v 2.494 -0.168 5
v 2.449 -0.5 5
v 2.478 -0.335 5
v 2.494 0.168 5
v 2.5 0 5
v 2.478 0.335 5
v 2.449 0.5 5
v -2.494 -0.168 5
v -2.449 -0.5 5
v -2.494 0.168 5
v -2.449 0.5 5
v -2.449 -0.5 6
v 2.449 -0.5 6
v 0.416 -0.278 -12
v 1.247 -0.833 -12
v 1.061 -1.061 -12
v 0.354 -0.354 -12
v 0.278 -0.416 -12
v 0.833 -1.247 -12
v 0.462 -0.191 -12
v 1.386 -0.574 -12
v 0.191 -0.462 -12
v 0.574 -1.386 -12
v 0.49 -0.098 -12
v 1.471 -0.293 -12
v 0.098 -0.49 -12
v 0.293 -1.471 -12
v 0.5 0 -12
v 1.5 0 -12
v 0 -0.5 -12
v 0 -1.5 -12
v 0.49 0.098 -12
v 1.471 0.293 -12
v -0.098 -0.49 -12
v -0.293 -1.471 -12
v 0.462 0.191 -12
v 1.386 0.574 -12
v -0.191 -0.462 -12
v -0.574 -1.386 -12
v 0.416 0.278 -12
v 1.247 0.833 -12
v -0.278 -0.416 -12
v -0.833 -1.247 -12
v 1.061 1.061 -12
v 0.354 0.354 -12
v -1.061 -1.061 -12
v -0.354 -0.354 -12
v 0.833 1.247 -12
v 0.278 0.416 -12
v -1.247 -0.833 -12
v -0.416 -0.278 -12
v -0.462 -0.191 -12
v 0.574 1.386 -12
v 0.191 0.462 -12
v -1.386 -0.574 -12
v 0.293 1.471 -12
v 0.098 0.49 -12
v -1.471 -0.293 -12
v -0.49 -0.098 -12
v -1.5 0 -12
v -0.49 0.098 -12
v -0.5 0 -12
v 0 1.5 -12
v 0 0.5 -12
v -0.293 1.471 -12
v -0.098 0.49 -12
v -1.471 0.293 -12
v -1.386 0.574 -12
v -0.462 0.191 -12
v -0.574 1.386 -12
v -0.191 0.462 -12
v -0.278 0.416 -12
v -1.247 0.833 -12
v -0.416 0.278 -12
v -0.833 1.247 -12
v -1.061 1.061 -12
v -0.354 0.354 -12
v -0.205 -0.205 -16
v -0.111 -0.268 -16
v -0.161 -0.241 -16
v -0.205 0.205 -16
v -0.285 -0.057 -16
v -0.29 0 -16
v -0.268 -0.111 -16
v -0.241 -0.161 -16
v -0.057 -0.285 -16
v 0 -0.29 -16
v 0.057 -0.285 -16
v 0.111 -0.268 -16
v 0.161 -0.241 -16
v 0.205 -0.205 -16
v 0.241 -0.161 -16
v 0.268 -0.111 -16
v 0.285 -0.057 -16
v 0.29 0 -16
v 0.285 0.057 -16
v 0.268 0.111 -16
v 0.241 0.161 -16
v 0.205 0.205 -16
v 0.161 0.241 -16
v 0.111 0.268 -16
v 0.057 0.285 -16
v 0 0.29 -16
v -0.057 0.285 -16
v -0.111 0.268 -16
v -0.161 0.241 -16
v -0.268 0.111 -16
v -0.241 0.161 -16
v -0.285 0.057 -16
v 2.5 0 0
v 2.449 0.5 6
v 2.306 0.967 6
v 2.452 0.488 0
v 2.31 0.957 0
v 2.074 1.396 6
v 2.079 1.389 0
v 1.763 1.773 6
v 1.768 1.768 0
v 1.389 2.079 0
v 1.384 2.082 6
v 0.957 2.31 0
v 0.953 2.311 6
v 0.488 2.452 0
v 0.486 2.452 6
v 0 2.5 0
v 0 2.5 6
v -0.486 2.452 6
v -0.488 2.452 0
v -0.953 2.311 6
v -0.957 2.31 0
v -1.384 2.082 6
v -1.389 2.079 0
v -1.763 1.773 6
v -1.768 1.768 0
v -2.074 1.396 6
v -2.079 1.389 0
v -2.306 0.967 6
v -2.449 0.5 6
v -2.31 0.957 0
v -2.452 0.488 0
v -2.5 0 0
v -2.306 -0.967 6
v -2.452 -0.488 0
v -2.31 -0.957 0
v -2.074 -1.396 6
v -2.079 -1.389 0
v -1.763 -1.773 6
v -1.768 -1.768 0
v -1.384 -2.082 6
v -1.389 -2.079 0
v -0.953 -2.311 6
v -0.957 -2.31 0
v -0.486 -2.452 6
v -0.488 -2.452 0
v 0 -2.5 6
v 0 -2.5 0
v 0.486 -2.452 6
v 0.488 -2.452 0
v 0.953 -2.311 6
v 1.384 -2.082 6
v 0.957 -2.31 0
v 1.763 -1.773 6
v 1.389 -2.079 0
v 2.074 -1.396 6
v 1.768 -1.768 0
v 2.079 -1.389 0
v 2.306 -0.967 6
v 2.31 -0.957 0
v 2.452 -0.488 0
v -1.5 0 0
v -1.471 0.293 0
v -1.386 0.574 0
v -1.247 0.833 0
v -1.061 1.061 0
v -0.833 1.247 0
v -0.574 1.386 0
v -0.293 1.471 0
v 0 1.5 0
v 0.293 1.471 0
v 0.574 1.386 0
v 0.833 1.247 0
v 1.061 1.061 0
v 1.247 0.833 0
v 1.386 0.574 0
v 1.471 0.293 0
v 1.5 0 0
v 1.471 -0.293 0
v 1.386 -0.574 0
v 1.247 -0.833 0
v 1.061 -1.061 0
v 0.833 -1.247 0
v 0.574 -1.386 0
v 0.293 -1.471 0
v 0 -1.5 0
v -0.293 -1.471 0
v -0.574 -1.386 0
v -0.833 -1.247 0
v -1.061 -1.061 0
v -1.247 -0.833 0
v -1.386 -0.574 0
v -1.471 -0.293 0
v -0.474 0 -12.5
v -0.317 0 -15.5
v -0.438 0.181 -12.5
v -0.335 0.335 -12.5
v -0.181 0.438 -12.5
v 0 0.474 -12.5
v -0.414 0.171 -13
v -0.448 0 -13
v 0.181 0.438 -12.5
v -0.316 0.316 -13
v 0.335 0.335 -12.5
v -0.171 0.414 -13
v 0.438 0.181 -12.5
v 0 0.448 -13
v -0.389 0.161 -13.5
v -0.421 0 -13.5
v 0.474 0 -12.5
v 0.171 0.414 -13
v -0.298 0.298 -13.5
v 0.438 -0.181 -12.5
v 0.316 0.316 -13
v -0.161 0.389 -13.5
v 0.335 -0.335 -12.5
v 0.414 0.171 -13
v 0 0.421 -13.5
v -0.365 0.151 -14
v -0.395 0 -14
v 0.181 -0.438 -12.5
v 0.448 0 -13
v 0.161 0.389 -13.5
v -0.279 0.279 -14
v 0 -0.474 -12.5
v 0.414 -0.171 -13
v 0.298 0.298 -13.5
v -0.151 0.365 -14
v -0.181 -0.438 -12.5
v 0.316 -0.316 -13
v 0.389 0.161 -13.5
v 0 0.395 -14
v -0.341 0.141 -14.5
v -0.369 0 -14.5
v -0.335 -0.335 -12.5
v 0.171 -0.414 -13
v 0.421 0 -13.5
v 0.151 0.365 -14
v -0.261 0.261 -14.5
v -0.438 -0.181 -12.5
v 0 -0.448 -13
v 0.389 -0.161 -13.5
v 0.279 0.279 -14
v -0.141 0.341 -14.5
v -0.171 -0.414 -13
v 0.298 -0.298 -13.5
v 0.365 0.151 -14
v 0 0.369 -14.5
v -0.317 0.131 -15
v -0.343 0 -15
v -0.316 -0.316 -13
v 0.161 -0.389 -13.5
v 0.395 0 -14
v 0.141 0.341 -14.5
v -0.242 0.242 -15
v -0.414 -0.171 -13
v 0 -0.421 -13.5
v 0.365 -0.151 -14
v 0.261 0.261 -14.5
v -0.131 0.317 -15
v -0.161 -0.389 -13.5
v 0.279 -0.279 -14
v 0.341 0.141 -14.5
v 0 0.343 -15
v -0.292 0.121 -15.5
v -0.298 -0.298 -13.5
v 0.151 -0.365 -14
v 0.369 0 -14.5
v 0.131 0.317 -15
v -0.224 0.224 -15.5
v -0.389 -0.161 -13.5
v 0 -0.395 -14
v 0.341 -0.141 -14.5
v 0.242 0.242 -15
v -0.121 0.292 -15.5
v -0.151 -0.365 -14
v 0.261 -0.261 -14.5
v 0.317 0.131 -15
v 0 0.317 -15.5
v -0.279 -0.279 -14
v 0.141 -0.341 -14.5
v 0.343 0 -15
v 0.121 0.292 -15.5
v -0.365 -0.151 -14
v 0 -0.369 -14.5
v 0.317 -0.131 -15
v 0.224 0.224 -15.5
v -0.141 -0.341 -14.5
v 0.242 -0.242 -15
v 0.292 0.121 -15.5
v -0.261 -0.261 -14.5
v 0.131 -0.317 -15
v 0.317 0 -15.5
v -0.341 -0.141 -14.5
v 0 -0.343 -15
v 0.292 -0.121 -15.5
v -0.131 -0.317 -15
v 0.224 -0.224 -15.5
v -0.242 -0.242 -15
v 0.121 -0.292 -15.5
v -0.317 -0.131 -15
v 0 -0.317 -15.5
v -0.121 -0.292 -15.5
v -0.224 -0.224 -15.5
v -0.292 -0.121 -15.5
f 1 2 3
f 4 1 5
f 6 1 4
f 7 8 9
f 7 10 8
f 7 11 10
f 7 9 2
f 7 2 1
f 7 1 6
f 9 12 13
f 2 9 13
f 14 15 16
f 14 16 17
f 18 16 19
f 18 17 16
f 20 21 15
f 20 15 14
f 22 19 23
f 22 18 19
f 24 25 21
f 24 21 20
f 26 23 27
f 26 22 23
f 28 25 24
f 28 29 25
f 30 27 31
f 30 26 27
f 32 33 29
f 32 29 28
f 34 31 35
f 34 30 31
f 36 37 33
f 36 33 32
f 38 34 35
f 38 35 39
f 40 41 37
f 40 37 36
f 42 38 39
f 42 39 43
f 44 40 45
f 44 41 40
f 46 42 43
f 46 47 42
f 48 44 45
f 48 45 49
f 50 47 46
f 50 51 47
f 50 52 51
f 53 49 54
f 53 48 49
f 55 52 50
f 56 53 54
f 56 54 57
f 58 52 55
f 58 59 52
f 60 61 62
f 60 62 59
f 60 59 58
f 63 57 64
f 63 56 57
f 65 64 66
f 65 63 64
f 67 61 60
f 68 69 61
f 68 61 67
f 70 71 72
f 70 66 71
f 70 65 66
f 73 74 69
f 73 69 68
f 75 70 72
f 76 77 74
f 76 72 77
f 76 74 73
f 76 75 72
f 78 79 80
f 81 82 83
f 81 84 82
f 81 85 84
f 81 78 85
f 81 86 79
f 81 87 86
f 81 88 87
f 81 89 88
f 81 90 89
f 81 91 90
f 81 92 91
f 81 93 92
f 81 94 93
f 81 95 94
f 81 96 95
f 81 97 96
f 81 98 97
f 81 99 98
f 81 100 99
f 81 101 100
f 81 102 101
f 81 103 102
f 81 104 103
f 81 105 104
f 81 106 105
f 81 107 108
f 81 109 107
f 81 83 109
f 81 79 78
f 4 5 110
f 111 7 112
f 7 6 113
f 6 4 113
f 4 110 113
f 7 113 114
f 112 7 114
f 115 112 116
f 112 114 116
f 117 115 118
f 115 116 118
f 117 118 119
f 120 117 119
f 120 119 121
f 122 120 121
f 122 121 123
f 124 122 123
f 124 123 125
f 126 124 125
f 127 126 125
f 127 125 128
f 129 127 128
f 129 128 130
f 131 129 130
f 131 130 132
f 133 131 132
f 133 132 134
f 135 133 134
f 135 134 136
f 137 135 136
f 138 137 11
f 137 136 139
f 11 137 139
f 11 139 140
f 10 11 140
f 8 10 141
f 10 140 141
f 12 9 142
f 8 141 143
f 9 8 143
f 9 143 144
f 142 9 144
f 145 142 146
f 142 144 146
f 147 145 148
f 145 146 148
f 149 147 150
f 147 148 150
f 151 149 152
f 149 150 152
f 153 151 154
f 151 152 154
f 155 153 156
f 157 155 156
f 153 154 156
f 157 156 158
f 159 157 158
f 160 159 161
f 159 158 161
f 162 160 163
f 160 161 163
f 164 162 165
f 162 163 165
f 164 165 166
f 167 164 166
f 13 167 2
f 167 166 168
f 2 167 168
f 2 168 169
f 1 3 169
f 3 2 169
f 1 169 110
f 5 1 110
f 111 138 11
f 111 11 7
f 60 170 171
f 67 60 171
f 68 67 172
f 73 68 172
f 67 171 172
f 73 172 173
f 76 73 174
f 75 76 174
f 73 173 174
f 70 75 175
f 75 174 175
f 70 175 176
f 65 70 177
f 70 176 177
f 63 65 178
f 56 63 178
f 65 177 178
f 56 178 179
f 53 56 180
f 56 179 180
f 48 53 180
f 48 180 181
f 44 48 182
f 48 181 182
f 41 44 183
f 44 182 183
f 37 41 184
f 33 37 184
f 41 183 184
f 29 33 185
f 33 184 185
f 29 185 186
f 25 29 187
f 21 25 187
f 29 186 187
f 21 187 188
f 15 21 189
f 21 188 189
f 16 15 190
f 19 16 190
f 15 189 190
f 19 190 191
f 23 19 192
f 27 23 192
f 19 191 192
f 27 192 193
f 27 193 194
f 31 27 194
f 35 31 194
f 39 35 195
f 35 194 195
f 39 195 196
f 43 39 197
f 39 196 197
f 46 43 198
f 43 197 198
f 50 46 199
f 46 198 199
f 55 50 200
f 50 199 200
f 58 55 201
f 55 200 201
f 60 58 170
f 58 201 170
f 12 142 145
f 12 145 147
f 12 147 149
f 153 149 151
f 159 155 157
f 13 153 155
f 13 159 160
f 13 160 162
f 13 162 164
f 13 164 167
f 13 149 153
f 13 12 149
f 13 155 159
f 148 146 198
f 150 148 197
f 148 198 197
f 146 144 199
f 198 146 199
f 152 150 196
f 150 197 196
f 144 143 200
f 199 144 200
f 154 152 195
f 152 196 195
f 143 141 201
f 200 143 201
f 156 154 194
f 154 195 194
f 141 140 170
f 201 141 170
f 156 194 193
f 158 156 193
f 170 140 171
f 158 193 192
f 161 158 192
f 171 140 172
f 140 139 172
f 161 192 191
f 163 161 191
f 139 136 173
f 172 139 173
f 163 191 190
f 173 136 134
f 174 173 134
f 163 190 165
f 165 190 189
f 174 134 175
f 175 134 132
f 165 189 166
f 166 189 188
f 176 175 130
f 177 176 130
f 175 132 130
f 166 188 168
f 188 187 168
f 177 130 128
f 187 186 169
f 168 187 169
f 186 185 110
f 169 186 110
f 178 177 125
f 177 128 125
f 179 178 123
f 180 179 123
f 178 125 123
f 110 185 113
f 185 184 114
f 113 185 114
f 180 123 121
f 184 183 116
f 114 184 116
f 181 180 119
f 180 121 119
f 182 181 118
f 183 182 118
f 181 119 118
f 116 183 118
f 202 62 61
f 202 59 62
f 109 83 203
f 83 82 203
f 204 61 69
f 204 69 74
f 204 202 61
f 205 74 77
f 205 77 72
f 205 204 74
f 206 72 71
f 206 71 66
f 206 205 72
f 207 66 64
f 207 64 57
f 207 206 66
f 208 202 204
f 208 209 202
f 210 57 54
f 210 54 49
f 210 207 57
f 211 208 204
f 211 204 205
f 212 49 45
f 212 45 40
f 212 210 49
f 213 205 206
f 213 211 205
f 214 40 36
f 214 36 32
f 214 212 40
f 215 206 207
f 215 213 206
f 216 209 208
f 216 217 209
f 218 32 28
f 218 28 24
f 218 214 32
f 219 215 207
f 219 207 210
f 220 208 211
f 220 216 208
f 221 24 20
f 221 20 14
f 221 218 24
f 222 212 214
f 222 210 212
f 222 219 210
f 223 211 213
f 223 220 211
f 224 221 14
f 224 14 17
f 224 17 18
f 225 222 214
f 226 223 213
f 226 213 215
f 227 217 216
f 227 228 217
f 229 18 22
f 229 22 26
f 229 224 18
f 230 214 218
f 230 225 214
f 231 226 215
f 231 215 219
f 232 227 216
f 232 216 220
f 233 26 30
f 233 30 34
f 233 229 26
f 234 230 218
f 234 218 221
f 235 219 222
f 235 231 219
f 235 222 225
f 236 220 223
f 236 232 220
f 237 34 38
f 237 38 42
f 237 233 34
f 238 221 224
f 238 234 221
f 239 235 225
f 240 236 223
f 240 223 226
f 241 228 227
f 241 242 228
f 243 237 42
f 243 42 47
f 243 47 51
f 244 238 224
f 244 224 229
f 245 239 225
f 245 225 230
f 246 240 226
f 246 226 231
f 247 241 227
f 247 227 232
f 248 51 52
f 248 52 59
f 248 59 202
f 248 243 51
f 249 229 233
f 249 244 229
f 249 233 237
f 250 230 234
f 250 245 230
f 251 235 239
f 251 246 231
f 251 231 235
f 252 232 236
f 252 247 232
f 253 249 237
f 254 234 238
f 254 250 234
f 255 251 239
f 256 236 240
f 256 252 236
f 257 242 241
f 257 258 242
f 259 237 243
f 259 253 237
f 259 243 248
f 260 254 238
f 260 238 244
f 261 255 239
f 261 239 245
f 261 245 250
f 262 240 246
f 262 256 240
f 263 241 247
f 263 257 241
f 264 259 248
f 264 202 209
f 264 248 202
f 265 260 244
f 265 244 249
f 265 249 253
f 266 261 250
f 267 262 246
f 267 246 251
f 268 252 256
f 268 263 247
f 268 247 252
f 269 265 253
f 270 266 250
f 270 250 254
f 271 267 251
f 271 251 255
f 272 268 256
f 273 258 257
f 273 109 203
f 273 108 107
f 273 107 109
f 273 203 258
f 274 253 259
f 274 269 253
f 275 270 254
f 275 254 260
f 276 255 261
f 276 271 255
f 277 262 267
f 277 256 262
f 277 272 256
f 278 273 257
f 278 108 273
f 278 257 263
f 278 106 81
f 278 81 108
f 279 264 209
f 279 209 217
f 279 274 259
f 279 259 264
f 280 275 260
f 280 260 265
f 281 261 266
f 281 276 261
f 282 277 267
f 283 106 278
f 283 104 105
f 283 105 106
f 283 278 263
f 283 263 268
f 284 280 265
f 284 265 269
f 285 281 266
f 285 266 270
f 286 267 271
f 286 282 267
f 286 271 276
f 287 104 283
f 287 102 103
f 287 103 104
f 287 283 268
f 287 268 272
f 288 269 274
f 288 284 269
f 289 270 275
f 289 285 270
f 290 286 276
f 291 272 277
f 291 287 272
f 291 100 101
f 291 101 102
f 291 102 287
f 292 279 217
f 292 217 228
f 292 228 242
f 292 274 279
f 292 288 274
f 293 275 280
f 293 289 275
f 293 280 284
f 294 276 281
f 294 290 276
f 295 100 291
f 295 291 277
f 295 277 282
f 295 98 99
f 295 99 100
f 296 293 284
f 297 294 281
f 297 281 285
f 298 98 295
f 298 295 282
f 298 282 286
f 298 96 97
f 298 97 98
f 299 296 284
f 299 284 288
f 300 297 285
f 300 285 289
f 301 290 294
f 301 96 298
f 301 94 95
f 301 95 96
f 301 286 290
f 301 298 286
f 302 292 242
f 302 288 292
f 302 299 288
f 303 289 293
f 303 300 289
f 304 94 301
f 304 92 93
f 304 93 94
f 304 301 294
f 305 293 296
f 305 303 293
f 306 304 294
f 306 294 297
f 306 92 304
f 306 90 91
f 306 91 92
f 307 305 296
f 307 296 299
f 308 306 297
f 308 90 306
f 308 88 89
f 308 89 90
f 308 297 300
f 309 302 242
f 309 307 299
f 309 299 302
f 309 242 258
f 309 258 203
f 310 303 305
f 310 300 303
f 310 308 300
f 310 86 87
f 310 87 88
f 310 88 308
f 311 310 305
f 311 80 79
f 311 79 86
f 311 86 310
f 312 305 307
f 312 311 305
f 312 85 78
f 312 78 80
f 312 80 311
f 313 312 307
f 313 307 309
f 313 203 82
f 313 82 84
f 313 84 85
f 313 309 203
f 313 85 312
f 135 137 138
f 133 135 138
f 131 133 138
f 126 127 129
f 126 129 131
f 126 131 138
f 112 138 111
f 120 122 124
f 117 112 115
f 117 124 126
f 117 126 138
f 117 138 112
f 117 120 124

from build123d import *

# Parameters (mm, degrees)
SKETCH1_R           = 2.5
BOSS_EXTRUDE1_DEPTH = 6
SKETCH2_W           = 5.368595506
SKETCH2_H           = 1
CUT_EXTRUDE1_DEPTH  = 1
SKETCH3_R           = 1.5
BOSS_EXTRUDE2_DEPTH = 12
SKETCH4_R           = 0.5
BOSS_EXTRUDE3_DEPTH = 4
BOSS_EXTRUDE3_TAPER = 3


with BuildPart() as part:
    # Sketch1 → Boss-Extrude1 (new body)
    with BuildSketch(Plane.XY):
        Circle(SKETCH1_R)
    extrude(amount=BOSS_EXTRUDE1_DEPTH)

    # Sketch2 → Cut-Extrude1 (cut)
    with BuildSketch(Plane.XY.offset(6)):
        Rectangle(SKETCH2_W, SKETCH2_H)
    extrude(amount=-CUT_EXTRUDE1_DEPTH, mode=Mode.SUBTRACT)

    # Sketch3 → Boss-Extrude2 (add)
    with BuildSketch(Plane(origin=(0, 0, 0), x_dir=(-1, 0, 0), z_dir=(0, 0, -1))):
        Circle(SKETCH3_R)
    extrude(amount=BOSS_EXTRUDE2_DEPTH)

    # Sketch4 → Boss-Extrude3 (add)
    with BuildSketch(Plane(origin=(0, 0, -12), x_dir=(-1, 0, 0), z_dir=(0, 0, -1))):
        Circle(SKETCH4_R)
    extrude(amount=BOSS_EXTRUDE3_DEPTH, taper=BOSS_EXTRUDE3_TAPER)


solid = part.part
